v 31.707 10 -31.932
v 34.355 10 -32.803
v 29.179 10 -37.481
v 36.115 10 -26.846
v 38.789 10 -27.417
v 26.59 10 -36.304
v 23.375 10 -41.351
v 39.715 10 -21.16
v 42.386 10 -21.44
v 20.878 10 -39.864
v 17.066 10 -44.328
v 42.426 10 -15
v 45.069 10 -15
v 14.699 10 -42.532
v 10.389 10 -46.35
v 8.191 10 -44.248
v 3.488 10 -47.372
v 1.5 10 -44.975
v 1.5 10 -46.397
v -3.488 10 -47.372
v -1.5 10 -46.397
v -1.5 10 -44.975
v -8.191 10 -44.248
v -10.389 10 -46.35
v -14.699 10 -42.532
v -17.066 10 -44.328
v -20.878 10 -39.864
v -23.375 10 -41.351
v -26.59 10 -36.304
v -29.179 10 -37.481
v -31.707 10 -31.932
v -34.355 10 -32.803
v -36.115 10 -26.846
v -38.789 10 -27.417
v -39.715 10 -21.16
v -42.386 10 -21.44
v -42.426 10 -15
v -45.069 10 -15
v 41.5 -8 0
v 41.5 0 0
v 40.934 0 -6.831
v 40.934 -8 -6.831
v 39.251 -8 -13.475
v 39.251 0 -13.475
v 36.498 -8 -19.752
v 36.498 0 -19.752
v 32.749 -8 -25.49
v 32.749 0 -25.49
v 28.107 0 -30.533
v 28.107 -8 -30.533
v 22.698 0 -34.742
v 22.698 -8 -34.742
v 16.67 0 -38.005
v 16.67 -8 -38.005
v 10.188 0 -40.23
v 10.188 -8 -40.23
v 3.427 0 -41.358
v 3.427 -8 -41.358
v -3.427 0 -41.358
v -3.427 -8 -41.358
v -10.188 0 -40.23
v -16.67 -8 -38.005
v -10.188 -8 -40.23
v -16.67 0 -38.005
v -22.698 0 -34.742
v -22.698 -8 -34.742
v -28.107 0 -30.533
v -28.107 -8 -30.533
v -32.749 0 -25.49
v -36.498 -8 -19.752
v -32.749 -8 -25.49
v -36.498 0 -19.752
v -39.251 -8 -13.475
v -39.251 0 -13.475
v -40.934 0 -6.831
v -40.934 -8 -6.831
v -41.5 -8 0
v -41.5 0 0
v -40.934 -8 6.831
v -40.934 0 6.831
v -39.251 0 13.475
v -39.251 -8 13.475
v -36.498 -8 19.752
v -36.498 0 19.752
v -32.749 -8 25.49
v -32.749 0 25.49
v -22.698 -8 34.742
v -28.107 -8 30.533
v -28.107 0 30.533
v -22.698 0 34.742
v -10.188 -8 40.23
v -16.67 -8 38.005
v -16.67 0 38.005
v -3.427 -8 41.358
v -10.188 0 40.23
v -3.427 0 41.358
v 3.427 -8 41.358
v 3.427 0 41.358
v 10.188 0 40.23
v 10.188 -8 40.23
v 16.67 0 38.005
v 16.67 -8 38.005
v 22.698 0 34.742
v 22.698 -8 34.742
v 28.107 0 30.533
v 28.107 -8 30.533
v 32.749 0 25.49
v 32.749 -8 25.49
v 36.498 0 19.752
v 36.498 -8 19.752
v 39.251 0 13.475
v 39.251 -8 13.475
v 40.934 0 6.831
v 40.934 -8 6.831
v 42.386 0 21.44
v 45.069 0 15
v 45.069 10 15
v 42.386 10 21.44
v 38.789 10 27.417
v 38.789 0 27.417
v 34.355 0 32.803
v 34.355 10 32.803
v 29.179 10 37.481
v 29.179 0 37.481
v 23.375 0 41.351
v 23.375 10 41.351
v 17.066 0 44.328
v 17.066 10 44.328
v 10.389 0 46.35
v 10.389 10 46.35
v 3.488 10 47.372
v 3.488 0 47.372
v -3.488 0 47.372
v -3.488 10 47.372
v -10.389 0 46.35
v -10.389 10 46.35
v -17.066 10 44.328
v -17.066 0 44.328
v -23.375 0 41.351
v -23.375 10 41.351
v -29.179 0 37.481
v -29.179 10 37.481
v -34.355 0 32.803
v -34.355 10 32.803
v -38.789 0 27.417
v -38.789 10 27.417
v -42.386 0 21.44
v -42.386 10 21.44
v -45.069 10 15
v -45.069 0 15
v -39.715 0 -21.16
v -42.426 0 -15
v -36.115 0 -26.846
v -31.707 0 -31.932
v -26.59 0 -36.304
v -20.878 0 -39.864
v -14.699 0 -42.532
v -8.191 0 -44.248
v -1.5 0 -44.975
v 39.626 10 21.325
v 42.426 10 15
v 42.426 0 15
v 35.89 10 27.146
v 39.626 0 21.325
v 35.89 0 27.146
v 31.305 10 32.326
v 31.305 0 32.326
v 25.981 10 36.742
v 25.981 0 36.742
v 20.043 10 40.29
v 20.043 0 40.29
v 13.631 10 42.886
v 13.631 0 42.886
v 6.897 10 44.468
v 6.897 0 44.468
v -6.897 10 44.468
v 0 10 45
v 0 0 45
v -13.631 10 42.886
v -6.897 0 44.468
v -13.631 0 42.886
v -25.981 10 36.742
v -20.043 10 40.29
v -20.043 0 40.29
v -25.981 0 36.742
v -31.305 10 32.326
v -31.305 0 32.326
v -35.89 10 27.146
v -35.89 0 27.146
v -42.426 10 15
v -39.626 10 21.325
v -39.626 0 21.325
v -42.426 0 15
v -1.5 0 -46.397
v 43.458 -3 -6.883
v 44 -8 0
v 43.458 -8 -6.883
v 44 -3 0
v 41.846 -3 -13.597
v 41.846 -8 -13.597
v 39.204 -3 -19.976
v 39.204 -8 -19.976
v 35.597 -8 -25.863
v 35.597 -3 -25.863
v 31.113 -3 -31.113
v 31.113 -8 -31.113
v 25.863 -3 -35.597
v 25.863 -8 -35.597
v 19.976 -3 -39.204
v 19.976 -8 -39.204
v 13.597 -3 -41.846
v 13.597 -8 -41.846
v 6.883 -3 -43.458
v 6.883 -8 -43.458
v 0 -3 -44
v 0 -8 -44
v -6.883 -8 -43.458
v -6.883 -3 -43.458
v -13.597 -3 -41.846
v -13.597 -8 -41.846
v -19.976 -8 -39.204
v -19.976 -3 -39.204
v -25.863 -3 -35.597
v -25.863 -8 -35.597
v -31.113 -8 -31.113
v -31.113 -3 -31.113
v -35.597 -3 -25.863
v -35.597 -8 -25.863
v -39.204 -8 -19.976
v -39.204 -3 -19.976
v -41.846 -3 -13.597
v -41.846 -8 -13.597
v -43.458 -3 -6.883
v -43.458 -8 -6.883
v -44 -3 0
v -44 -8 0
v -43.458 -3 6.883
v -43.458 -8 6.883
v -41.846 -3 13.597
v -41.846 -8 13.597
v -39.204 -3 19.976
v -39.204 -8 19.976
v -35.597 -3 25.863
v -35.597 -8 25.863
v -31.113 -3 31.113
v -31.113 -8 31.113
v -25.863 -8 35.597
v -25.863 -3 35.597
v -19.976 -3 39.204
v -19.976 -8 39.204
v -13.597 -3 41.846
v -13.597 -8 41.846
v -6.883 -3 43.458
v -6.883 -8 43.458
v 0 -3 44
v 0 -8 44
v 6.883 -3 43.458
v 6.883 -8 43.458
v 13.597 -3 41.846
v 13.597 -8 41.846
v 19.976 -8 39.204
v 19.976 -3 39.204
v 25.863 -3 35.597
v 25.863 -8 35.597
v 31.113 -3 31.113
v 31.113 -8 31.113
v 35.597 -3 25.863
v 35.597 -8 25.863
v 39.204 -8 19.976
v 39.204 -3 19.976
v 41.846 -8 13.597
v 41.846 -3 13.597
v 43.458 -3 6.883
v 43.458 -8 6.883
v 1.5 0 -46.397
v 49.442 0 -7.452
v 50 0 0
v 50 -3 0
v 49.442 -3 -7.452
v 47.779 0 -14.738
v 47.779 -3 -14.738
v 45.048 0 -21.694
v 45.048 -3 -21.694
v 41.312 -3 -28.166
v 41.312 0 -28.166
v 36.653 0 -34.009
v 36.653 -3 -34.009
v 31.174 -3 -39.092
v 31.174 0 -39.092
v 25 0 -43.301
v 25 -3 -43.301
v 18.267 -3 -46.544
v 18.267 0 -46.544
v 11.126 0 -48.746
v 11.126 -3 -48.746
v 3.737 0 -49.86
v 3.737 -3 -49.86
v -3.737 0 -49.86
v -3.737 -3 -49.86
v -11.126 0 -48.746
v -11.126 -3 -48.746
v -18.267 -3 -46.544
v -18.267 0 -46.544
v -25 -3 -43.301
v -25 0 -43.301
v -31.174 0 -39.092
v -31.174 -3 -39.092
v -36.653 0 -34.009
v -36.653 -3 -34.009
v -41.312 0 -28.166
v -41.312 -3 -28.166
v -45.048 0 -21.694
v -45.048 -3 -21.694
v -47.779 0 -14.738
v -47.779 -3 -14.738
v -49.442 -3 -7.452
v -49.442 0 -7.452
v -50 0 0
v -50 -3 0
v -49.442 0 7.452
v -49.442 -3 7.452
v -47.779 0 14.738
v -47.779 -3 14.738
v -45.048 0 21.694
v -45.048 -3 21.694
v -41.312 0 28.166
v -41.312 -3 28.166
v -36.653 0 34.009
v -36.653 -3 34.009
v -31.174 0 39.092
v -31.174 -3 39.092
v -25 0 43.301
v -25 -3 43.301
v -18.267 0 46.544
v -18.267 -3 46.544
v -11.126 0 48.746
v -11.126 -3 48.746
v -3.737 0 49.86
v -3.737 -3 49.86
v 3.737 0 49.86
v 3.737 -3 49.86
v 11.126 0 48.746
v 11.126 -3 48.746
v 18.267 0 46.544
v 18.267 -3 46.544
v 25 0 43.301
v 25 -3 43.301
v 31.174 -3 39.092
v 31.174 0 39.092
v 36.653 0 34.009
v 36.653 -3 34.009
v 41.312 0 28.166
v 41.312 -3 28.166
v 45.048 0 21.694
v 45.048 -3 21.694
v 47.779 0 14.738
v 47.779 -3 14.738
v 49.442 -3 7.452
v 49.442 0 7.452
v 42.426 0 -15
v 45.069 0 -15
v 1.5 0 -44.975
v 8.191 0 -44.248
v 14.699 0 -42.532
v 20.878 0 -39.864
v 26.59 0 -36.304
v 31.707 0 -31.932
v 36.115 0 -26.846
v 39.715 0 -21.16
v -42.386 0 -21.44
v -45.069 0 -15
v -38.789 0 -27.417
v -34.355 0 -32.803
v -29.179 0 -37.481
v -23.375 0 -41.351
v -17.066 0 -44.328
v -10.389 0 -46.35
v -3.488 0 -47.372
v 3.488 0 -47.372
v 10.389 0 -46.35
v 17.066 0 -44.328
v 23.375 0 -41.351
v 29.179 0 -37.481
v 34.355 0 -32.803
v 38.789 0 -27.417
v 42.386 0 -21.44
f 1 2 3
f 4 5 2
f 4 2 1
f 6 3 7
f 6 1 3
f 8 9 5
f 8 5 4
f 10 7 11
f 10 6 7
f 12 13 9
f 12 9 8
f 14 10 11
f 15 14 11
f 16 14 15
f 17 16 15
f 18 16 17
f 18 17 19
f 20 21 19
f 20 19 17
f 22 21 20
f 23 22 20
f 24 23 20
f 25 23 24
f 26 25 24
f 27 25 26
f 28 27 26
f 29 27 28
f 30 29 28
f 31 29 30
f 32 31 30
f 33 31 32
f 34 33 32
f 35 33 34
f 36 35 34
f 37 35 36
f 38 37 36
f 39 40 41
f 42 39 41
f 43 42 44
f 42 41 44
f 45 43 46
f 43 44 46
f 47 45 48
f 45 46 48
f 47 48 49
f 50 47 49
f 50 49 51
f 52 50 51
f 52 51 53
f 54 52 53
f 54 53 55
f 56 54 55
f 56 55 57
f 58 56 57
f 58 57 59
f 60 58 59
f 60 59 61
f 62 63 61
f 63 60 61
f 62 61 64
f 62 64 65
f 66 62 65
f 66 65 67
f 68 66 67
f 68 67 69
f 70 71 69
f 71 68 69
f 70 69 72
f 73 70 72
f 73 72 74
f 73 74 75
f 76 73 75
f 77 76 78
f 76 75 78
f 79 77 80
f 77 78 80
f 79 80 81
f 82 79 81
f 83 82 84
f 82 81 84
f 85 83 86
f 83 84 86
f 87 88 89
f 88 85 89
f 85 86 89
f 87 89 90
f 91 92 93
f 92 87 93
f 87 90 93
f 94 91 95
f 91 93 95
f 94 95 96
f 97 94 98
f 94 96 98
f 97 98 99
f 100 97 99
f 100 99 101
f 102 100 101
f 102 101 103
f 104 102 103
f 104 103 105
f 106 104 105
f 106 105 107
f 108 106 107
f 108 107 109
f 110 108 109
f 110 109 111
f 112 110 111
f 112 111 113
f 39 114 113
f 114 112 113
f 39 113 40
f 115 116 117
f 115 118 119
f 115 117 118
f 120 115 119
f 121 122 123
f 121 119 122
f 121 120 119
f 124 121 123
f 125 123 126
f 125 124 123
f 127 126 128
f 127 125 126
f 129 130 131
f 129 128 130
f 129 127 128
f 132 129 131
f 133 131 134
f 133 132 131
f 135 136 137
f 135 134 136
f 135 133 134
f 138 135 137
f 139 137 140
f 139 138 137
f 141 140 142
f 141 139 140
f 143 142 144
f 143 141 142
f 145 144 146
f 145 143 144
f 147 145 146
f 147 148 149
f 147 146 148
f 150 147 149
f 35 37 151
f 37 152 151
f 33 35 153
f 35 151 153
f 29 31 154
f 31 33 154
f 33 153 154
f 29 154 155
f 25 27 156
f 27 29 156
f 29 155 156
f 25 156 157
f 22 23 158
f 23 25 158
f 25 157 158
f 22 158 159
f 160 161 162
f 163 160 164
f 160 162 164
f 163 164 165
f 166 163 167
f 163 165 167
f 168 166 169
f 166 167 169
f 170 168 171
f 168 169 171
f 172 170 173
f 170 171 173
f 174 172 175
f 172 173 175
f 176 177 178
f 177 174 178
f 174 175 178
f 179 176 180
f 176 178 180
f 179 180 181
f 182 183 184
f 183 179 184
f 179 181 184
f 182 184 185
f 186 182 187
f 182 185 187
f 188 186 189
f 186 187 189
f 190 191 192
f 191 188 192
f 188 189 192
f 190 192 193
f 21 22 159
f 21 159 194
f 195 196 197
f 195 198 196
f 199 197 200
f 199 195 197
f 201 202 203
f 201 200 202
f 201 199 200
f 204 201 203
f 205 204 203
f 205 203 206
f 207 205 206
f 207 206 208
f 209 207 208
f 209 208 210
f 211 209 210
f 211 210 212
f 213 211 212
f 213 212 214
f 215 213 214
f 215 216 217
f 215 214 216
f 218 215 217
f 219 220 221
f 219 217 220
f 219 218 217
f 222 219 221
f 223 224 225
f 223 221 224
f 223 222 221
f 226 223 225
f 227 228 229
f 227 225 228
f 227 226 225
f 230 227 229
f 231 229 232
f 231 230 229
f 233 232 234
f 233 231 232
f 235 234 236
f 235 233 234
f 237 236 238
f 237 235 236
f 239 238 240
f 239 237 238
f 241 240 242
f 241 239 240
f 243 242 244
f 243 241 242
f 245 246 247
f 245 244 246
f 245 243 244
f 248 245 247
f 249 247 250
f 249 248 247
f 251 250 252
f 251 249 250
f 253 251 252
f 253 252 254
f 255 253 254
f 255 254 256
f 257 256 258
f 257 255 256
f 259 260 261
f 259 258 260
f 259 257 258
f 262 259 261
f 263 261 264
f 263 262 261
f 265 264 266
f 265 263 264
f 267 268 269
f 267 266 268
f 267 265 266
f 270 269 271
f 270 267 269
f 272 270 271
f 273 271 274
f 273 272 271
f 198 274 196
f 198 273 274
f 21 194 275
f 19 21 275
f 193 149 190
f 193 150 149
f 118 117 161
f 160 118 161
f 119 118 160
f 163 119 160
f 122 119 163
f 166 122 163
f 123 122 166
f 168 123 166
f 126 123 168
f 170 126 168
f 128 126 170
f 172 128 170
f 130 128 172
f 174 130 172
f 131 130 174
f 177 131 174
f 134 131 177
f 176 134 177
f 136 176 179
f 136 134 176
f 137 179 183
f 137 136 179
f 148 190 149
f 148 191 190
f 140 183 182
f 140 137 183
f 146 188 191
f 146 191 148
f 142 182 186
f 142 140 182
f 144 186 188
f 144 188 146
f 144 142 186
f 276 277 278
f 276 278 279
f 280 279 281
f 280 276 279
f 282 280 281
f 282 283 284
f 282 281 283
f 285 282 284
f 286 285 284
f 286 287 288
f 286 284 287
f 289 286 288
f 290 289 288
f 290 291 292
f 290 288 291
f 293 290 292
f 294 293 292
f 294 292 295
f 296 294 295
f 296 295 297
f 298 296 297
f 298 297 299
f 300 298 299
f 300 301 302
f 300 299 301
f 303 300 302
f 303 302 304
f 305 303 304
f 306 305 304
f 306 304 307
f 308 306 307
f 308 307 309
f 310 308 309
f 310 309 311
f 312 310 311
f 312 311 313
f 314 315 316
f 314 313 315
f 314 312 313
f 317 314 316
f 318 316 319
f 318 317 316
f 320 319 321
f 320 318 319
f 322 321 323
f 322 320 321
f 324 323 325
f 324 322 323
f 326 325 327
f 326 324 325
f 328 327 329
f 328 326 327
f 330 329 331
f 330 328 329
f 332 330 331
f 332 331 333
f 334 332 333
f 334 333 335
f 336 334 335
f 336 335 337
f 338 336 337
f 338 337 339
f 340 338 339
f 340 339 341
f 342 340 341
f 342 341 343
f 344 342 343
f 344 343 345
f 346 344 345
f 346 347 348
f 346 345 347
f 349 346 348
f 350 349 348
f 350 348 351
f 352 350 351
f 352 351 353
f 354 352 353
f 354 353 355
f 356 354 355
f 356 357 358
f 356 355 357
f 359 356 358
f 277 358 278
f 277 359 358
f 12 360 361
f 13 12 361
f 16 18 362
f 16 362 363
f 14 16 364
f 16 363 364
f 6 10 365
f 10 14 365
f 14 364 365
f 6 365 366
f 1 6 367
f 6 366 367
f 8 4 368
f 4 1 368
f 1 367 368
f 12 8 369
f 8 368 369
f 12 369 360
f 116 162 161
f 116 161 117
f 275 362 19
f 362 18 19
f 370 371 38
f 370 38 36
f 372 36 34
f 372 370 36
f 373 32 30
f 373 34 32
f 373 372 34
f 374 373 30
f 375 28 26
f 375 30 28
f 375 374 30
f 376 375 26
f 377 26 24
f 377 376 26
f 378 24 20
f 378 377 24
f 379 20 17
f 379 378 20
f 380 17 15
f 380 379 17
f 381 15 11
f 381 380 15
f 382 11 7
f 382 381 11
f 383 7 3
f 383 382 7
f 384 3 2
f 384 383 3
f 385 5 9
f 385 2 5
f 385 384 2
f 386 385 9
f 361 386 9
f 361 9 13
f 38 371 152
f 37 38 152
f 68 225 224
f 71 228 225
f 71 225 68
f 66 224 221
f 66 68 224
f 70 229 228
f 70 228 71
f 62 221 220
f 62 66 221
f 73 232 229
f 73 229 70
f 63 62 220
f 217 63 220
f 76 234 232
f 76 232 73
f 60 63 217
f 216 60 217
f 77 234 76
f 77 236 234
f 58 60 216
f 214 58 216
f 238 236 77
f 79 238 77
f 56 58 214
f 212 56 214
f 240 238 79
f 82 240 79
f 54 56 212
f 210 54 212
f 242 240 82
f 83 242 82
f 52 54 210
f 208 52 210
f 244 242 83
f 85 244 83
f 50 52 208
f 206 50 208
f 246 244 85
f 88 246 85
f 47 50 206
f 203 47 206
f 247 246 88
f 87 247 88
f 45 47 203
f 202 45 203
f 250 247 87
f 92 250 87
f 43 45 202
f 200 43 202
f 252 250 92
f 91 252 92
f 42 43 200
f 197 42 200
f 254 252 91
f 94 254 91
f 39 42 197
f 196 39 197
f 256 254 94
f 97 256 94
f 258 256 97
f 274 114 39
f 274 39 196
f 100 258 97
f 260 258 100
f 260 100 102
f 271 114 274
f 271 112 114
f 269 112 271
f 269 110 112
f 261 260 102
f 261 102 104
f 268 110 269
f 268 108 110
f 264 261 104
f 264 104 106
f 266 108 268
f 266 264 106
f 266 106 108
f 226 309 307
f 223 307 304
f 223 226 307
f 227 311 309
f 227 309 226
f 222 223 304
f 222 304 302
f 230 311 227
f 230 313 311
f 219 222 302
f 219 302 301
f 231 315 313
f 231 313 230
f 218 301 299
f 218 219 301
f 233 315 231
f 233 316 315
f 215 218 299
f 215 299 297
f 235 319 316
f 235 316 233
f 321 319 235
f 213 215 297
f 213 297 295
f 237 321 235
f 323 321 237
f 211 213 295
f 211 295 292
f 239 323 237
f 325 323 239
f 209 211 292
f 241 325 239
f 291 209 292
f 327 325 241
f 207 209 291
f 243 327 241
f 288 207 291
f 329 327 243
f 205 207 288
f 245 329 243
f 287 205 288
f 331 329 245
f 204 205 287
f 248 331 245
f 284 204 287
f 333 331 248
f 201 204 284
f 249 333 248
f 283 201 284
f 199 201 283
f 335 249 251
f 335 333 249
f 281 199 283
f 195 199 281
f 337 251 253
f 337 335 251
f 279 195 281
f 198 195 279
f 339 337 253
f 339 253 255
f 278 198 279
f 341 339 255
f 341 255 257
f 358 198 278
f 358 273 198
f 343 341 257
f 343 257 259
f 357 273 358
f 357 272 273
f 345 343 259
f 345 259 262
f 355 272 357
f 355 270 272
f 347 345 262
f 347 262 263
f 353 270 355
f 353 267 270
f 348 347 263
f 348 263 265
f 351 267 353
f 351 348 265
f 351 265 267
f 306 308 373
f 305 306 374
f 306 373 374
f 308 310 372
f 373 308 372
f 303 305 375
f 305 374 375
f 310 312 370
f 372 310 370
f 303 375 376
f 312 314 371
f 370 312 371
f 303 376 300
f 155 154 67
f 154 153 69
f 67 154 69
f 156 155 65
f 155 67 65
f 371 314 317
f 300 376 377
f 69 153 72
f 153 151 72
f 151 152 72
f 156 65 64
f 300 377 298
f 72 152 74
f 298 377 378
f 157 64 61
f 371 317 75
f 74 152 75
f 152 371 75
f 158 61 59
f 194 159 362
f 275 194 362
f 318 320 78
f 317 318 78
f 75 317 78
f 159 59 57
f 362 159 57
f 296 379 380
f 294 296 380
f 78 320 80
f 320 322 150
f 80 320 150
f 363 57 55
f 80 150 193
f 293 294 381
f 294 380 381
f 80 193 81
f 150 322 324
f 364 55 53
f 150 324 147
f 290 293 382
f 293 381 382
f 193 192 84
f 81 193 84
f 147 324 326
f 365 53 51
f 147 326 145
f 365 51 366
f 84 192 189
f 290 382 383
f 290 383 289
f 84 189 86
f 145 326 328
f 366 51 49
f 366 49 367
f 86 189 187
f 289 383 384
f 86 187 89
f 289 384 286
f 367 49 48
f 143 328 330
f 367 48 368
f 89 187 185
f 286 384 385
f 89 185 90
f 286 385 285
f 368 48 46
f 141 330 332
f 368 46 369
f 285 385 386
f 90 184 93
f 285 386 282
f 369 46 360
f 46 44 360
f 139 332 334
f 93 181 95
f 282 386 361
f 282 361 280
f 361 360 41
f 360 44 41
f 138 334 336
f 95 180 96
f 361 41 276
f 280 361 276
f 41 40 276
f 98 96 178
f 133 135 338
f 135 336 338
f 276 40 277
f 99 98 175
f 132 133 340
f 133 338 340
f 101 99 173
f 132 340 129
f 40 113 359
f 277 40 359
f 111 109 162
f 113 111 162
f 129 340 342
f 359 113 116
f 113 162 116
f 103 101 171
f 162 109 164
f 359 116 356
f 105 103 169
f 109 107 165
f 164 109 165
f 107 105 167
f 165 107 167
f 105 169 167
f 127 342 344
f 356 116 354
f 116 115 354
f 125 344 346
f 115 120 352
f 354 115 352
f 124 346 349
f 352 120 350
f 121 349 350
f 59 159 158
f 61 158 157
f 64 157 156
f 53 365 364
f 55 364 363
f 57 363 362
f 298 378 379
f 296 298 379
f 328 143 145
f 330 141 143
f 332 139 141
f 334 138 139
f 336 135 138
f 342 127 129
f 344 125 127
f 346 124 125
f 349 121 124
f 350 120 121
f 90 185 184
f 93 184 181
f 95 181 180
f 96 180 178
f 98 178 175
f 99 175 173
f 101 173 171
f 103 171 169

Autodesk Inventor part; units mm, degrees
ref_plane "YZ Plane" through (0, 0, 0) normal (1, 0, 0) x (0, 1, 0)
ref_plane "XZ Plane" through (0, 0, 0) normal (0, 1, 0) x (-1, 0, 0)
ref_plane "XY Plane" through (0, 0, 0) normal (0, 0, 1) x (1, 0, 0)
sketch "Skizze1" plane through (0, 0, 0) normal (0, 1, 0) x (-1, 0, 0)
  circle A0 centre (0, 0) radius 45
  circle A1 centre (0, 0) radius 47.5
  dimension "d0" = 90
  dimension "d1" = 95
extrude "Extrusion1" add sketch "Skizze1" along normal blind 10
sketch "Skizze2" plane through (0, 0, 0) normal (0, -1, 0) x (1, 0, 0)
  circle A0 centre (0, 0) radius 41.5
  circle A1 centre (0, 0) radius 50
  dimension "d4" = 83
  dimension "d5" = 100
extrude "Extrusion2" add sketch "Skizze2" along normal blind 3
sketch "Skizze3" plane through (0, -3, 0) normal (0, -1, 0) x (1, 0, 0)
  circle A0 centre (0, 0) radius 41.5
  circle A1 centre (0, 0) radius 44
  dimension "d8" = 83
  dimension "d9" = 88
extrude "Extrusion3" add sketch "Skizze3" along normal blind 5
sketch "Skizze4" plane through (0, 0, 0) normal (0, 1, 0) x (1, 0, 0)
  line L0 (-86, 0) -> (65, 0) construction
  line L1 (-86, 15) -> (65, 15)
  line L2 (-86, -15) -> (65, -15)
  line L3 (-86, 15) -> (-86, -15)
  line L4 (65, -15) -> (65, 15)
  point P0 (0, 0)
  dimension "d12" = 15
  dimension "d13" = 15
extrude "Extrusion4" cut sketch "Skizze4" along normal up to surface (10 mm away)
sketch "Skizze5" plane through (0, 10, 0) normal (0, 1, 0) x (1, 0, 0)
  line L0 (0, 0) -> (0, 69) construction
  line L1 (-1.5, 0) -> (-1.5, 46.3972)
  line L2 (1.5, 0) -> (1.5, 46.3972)
  line L3 (-1.5, 0) -> (1.5, 0)
  line L4 (-1.5, 46.3972) -> (1.5, 46.3972)
  dimension "d16" = 1.5
extrude "Extrusion5" cut sketch "Skizze5" against normal up to surface (10 mm away)
properties part number "Teesiebhalter"
